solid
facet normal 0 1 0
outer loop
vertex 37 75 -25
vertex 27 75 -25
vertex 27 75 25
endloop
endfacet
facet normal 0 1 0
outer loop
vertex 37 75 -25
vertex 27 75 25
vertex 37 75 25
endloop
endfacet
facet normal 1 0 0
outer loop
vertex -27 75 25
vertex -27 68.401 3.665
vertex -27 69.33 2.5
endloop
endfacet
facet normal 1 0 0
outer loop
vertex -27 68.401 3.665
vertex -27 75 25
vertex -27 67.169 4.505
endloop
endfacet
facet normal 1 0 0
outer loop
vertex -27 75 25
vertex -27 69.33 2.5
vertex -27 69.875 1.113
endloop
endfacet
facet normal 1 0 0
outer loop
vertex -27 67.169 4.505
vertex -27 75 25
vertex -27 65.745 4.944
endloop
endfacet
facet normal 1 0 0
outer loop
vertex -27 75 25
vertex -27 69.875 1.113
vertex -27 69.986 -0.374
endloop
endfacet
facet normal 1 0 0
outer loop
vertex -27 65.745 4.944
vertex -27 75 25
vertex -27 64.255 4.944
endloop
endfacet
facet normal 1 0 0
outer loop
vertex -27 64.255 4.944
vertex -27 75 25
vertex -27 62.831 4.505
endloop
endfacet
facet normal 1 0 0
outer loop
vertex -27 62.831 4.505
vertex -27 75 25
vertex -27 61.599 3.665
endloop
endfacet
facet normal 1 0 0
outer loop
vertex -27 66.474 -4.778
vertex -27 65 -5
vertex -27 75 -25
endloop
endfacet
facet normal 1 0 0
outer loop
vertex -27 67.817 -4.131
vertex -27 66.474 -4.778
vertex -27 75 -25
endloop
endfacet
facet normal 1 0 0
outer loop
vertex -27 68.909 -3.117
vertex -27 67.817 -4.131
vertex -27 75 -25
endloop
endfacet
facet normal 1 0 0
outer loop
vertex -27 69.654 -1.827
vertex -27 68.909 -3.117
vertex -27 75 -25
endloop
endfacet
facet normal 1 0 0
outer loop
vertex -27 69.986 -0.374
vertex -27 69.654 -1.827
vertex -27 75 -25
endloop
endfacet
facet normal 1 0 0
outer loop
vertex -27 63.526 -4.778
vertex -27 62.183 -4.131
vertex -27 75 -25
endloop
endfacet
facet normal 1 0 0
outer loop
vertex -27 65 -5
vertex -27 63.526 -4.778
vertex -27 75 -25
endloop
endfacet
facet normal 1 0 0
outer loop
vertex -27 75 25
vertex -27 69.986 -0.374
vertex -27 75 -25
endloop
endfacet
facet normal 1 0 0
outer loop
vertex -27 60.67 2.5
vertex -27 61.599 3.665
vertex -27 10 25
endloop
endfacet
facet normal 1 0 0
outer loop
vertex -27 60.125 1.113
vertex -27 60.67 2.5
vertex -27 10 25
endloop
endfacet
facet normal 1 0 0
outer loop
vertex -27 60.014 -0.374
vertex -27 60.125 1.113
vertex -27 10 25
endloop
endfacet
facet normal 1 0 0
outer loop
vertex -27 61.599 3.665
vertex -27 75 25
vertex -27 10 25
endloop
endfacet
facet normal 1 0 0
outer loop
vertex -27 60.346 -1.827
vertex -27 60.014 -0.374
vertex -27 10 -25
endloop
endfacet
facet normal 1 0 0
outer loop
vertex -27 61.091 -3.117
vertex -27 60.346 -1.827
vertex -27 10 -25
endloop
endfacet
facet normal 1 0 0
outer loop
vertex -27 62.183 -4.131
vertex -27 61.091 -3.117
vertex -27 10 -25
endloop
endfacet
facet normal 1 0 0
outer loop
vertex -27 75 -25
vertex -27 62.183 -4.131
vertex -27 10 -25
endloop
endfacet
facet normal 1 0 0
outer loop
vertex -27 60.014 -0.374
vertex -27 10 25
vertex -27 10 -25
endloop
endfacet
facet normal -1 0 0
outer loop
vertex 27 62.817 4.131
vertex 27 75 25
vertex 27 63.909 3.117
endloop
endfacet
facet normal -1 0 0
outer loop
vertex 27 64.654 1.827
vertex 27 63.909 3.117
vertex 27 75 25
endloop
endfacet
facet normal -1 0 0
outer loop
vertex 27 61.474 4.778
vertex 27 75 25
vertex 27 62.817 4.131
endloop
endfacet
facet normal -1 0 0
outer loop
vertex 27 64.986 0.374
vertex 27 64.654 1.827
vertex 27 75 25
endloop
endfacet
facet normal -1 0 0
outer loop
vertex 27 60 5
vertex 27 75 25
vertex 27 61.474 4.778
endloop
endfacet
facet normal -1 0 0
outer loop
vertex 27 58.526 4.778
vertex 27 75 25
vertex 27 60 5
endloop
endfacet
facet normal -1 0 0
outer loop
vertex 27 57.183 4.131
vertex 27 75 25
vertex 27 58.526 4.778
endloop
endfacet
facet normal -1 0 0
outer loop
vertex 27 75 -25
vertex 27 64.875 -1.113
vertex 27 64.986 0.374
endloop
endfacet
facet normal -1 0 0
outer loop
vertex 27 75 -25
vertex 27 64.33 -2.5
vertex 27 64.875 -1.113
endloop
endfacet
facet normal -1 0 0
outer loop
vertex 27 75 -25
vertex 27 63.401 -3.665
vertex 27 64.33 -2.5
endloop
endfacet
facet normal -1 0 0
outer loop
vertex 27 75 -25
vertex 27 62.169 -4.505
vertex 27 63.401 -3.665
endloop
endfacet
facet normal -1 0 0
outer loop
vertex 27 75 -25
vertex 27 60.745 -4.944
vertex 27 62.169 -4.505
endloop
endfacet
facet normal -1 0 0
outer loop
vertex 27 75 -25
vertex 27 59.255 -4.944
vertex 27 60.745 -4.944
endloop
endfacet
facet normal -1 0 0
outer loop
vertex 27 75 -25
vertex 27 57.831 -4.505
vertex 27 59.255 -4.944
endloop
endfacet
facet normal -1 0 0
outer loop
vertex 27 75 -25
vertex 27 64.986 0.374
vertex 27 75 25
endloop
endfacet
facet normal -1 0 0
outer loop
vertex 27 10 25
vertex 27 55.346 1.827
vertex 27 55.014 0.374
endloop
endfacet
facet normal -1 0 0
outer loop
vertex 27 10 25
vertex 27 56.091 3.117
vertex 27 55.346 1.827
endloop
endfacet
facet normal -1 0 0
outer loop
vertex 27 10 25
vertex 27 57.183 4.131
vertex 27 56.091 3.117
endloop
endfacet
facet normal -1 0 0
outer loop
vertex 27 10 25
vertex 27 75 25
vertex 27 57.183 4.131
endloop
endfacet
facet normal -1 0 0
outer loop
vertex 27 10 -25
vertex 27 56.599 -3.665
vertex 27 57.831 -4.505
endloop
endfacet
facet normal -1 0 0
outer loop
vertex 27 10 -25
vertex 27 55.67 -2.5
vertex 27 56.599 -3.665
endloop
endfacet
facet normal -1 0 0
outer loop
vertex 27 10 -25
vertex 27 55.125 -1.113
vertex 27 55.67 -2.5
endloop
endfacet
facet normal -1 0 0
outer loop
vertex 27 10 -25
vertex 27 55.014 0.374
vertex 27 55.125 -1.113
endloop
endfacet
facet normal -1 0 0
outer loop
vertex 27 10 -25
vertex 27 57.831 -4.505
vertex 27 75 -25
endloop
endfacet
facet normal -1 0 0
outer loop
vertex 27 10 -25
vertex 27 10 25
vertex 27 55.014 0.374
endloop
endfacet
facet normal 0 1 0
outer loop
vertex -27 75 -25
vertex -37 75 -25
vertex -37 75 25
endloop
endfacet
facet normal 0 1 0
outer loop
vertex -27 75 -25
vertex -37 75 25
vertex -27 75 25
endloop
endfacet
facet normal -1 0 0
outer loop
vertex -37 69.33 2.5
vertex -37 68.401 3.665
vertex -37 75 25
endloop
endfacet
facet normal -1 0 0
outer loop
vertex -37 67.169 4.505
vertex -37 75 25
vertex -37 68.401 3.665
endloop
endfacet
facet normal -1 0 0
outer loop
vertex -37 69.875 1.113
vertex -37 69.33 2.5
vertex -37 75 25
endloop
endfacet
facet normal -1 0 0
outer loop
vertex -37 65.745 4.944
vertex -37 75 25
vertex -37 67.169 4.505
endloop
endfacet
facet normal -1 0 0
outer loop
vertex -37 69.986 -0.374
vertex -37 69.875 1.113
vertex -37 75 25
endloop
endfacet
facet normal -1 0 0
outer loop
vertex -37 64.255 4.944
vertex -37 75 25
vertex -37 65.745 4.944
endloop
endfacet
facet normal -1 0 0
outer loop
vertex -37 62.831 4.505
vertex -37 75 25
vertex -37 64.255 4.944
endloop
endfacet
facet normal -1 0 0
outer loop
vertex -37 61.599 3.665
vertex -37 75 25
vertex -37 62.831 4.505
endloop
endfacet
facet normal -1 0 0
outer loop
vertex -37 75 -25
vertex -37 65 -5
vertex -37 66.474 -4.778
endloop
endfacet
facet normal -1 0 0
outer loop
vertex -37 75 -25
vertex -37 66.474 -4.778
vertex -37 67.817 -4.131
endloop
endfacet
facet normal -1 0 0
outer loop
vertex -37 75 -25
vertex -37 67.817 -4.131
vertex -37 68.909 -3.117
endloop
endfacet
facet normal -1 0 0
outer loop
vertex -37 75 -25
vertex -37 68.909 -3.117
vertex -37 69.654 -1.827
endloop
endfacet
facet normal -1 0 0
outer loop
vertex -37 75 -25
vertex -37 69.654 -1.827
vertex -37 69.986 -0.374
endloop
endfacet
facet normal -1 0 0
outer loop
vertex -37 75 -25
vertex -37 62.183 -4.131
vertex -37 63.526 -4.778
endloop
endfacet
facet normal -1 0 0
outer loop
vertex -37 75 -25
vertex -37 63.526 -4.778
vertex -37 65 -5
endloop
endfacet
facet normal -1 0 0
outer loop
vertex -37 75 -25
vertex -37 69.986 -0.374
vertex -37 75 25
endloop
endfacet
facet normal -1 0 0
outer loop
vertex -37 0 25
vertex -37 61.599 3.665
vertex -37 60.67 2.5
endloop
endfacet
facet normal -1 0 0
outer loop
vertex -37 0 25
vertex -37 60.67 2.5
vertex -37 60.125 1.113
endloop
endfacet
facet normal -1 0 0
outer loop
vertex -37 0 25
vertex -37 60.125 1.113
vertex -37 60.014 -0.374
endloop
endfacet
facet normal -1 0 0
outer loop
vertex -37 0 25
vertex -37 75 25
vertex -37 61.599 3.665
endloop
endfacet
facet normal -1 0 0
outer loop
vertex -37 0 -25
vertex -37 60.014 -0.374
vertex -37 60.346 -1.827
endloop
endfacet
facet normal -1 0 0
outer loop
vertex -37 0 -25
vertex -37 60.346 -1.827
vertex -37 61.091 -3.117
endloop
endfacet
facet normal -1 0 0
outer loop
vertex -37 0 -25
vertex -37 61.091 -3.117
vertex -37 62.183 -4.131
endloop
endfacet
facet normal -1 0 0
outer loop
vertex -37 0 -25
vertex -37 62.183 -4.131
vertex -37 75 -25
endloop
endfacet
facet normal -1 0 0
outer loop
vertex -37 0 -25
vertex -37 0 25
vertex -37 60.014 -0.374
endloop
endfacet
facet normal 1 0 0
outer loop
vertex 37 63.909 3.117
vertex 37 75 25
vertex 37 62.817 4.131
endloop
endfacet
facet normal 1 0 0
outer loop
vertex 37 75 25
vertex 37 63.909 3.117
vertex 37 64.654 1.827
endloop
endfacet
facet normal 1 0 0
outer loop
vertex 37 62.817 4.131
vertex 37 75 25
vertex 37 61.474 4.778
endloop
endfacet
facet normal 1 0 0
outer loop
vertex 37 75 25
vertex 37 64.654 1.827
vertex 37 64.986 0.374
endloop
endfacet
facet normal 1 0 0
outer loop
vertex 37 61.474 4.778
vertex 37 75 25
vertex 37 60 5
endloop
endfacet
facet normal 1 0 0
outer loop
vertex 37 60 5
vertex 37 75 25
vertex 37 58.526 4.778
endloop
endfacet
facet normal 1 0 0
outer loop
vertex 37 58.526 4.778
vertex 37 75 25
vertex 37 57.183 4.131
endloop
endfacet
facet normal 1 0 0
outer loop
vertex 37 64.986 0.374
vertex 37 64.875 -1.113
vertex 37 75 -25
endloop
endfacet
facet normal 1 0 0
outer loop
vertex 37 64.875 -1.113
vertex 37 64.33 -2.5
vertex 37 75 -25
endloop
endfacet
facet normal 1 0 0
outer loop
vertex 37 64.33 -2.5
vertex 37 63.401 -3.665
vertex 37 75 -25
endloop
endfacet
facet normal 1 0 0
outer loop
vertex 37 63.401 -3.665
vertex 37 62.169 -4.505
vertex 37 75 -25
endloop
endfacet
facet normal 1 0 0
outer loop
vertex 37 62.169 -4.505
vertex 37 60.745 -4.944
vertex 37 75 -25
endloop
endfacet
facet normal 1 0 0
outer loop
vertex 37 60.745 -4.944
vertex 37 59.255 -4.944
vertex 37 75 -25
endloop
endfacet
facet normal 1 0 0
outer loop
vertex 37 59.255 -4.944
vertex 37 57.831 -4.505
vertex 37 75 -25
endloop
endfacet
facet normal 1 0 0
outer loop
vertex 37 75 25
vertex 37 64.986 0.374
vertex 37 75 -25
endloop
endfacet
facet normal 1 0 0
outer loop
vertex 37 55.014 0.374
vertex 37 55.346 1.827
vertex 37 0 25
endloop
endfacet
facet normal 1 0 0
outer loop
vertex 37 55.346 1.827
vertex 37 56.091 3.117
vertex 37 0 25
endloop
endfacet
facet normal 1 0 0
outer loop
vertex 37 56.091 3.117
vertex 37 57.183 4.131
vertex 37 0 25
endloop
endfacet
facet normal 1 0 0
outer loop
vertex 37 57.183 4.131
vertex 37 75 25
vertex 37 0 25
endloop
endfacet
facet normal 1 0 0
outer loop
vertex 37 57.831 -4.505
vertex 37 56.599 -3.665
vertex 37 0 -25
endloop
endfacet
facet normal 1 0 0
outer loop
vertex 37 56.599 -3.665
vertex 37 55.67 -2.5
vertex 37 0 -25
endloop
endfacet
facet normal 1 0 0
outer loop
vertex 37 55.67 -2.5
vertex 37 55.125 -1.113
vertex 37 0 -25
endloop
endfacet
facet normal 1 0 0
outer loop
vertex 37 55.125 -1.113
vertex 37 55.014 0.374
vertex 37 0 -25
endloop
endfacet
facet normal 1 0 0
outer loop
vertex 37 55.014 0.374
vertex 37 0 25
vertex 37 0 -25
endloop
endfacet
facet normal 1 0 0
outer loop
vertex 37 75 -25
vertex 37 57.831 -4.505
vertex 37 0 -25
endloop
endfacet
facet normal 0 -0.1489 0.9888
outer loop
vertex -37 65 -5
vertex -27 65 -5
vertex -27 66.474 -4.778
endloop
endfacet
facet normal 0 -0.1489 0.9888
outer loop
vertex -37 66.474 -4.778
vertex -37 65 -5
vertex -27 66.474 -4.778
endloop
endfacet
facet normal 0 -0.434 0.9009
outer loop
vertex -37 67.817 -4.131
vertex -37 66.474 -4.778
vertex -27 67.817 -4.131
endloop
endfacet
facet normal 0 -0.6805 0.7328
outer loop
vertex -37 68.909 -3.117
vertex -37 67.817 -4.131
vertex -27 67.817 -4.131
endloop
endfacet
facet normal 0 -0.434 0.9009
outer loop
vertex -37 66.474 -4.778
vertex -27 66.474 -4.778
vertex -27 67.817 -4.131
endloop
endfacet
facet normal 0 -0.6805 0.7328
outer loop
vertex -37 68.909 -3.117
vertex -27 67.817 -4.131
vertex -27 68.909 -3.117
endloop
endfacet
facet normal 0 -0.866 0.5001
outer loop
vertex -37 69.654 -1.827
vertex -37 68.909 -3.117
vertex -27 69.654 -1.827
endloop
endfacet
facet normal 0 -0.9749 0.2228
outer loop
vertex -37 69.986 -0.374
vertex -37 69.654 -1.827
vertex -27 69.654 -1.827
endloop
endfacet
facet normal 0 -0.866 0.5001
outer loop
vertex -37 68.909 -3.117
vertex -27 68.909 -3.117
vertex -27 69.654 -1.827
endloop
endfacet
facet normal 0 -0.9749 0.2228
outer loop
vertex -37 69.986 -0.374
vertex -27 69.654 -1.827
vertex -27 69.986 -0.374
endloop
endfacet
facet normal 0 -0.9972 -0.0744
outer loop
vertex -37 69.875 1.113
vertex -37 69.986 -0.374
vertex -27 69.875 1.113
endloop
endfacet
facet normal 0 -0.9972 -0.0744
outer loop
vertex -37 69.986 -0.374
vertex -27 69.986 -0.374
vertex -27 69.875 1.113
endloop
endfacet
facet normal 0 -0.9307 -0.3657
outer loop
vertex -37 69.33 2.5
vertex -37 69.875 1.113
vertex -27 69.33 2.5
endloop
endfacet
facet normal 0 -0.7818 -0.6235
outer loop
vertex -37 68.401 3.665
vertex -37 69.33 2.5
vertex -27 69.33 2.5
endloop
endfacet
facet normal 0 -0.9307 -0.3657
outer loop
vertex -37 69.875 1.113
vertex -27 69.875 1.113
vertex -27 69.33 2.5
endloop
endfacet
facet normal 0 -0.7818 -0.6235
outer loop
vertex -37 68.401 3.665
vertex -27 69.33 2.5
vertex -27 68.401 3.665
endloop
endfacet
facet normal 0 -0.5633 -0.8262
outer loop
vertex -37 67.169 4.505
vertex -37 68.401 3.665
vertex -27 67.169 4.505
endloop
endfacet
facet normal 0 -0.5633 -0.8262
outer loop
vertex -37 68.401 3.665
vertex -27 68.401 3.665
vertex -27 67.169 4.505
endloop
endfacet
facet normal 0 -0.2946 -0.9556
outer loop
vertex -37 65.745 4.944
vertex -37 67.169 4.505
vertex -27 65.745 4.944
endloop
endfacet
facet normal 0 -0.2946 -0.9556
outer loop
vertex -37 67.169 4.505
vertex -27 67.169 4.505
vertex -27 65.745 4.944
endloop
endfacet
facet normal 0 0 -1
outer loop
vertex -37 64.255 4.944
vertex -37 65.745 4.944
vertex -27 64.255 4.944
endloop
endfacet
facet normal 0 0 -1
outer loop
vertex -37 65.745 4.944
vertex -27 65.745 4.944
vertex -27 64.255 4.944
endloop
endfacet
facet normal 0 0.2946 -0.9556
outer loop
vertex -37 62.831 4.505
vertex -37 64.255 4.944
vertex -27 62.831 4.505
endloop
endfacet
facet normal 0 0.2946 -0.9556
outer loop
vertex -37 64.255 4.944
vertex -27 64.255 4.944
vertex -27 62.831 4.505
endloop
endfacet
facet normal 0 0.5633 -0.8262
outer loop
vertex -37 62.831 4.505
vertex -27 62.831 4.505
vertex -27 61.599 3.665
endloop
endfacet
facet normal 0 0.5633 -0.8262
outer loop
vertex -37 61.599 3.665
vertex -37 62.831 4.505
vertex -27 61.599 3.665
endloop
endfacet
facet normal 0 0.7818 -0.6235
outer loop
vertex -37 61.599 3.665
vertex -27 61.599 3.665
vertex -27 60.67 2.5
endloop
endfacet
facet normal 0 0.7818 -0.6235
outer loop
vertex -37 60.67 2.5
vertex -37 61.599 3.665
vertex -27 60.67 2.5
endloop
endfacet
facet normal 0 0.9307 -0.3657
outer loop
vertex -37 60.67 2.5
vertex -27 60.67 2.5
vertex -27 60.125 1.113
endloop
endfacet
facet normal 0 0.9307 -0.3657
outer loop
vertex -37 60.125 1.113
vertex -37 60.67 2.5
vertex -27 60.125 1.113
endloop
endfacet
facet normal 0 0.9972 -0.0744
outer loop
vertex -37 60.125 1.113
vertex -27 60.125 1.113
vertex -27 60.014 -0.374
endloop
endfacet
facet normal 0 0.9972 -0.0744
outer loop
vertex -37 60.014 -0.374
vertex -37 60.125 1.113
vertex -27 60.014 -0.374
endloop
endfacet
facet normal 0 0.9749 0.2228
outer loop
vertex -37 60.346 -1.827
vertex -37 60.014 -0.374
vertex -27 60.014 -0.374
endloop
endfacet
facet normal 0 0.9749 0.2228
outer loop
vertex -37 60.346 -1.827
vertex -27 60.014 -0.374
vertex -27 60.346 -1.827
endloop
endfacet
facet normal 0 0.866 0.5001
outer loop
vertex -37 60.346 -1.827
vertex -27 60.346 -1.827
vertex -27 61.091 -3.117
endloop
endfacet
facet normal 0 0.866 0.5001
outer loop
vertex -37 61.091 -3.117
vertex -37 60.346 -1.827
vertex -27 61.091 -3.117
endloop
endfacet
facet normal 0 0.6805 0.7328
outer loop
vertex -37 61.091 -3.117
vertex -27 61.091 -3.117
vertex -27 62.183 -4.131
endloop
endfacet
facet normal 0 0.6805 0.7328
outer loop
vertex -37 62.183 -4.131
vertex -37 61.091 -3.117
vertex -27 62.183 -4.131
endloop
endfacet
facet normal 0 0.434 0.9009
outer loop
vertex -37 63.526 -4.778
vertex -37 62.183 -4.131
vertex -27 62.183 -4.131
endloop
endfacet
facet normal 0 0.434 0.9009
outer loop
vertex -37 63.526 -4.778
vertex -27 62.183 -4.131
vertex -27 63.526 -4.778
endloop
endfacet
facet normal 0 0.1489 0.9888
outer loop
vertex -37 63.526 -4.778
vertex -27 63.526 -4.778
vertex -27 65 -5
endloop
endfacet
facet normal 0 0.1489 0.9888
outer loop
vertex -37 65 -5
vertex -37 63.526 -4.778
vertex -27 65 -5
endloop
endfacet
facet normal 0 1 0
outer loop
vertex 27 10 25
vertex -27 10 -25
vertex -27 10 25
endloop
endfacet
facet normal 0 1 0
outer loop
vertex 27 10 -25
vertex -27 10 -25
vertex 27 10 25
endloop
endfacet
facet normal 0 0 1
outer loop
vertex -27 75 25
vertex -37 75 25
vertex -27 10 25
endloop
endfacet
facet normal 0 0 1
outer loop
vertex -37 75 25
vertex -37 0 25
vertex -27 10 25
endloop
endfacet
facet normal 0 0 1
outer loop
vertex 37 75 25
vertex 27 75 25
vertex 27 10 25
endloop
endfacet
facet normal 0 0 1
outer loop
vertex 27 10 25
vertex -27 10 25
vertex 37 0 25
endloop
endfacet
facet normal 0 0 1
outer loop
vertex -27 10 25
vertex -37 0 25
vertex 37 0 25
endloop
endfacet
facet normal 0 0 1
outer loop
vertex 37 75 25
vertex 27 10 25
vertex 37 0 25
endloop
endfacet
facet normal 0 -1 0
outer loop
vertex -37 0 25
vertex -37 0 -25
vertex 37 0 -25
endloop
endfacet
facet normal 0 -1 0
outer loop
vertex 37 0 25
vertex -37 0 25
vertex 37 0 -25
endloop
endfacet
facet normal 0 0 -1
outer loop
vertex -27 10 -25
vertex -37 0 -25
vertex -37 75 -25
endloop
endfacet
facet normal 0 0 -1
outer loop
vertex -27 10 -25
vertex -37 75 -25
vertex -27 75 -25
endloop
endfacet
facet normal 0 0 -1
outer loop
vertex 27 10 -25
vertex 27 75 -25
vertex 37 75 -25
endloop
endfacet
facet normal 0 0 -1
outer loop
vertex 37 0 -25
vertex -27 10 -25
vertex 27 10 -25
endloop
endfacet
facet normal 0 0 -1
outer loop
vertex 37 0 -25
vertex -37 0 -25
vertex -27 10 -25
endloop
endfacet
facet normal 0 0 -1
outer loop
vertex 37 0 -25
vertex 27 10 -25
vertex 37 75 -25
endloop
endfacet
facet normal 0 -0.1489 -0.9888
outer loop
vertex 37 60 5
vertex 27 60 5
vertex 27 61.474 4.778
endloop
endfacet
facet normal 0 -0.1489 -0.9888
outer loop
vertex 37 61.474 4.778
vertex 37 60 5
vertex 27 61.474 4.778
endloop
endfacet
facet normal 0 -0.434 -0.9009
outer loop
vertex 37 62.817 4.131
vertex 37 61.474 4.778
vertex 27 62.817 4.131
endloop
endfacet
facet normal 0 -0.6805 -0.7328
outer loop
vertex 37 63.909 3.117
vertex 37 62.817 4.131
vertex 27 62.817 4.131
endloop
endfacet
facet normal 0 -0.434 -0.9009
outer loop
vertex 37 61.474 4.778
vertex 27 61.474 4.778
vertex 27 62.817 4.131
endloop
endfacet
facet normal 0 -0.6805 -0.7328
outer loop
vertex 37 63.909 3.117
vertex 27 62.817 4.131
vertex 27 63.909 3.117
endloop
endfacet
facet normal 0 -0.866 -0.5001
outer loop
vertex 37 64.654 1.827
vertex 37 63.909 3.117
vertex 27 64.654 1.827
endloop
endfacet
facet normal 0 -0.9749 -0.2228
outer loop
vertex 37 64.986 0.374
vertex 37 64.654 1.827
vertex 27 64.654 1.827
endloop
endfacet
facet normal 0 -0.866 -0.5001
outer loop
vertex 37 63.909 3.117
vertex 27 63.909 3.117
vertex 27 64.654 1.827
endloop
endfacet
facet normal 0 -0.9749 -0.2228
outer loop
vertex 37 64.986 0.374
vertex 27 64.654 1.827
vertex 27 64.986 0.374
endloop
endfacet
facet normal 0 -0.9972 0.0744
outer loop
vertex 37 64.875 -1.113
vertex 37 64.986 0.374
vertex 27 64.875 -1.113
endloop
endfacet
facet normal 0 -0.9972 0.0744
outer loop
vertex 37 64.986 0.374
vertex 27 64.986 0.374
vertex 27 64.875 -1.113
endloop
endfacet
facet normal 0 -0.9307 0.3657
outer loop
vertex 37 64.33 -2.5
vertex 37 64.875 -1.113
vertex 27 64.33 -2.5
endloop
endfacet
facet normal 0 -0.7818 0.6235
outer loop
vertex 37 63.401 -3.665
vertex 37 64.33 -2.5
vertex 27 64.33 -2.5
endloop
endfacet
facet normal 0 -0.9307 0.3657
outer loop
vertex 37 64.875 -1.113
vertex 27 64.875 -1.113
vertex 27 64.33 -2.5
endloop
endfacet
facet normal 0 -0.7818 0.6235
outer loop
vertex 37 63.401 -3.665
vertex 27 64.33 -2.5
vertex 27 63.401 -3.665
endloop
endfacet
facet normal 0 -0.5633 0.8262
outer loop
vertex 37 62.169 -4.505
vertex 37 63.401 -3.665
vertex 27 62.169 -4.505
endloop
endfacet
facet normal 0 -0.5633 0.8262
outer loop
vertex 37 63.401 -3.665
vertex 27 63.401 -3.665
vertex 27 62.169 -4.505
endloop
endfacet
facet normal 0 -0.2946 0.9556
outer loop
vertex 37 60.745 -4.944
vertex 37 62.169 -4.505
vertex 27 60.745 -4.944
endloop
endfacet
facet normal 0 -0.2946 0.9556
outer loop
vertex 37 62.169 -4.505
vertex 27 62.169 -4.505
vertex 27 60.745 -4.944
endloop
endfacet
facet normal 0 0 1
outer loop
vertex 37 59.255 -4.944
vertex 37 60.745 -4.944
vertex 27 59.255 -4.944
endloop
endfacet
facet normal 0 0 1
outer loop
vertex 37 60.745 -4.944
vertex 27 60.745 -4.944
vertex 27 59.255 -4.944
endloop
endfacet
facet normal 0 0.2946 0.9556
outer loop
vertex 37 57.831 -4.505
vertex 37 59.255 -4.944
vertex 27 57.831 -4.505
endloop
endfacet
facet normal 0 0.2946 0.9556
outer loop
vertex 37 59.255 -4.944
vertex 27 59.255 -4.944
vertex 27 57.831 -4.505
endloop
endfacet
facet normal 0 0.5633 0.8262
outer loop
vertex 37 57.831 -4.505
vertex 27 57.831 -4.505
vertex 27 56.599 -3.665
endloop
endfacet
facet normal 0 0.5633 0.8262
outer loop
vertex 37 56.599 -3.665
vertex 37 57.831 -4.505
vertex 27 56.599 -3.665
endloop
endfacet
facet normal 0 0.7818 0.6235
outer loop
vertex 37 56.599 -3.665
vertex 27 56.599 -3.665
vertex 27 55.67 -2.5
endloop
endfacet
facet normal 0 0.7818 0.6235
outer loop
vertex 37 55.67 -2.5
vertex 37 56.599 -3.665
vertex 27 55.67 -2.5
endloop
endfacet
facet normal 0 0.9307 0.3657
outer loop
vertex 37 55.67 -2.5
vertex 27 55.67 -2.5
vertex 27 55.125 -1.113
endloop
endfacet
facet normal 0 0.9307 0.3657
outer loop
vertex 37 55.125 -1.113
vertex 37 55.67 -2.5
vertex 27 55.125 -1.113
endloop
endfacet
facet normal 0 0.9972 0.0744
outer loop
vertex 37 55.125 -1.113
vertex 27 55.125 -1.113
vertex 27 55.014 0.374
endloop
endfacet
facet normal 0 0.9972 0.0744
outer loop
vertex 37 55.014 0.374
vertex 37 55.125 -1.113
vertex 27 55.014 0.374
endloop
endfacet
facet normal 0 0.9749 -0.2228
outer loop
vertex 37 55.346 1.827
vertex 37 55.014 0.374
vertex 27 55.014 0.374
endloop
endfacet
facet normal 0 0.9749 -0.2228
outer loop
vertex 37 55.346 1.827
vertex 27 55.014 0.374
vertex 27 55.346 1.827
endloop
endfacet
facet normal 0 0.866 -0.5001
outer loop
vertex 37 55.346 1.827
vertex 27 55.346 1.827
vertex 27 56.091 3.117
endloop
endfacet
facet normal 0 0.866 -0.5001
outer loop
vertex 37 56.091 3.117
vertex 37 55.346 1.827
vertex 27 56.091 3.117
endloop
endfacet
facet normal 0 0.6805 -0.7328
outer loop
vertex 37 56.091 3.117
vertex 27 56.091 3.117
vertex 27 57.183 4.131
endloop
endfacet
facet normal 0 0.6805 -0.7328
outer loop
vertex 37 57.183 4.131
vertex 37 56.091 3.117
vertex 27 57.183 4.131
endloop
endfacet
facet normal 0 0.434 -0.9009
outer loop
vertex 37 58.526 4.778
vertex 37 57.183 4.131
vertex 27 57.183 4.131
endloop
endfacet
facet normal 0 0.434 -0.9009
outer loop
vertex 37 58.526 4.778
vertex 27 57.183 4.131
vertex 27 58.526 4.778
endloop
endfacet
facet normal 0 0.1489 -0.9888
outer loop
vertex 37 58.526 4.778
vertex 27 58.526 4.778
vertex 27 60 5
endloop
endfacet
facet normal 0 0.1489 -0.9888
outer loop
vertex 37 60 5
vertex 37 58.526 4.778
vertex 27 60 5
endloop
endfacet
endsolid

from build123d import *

# Parameters (mm, degrees)
SKETCH1_W           = 74
SKETCH1_H           = 50
BOSS_EXTRUDE1_DEPTH = 10
SKETCH2_W           = 10
SKETCH2_H           = 50
BOSS_EXTRUDE2_DEPTH = 65
SKETCH3_R           = 5
CUT_EXTRUDE1_DEPTH  = 60
SKETCH4_R           = 5
CUT_EXTRUDE3_DEPTH  = 60


with BuildPart() as part:
    # Sketch1 → Boss-Extrude1 (new body)
    with BuildSketch(Plane(origin=(0, 0, 0), x_dir=(1, 0, 0), z_dir=(0, 1, 0))):
        Rectangle(SKETCH1_W, SKETCH1_H)
    extrude(amount=BOSS_EXTRUDE1_DEPTH)

    # Sketch2 → Boss-Extrude2 (add)
    with BuildSketch(Plane(origin=(0, 10, 0), x_dir=(1, 0, 0), z_dir=(0, 1, 0))):
        with Locations((-32, 0)):
            Rectangle(SKETCH2_W, SKETCH2_H)
        with Locations((32, 0)):
            Rectangle(SKETCH2_W, SKETCH2_H)
    extrude(amount=BOSS_EXTRUDE2_DEPTH)

    # Sketch3 → Cut-Extrude1 (cut)
    with BuildSketch(Plane(origin=(-27, 0, 0), x_dir=(0, 0, -1), z_dir=(1, 0, 0))):
        with Locations((0, 65)):
            Circle(SKETCH3_R)
    extrude(amount=-CUT_EXTRUDE1_DEPTH, mode=Mode.SUBTRACT)

    # Sketch4 → Cut-Extrude3 (cut)
    with BuildSketch(Plane.ZY.offset(-27)):
        with Locations((0, 60)):
            Circle(SKETCH4_R)
    extrude(amount=-CUT_EXTRUDE3_DEPTH, mode=Mode.SUBTRACT)


solid = part.part
